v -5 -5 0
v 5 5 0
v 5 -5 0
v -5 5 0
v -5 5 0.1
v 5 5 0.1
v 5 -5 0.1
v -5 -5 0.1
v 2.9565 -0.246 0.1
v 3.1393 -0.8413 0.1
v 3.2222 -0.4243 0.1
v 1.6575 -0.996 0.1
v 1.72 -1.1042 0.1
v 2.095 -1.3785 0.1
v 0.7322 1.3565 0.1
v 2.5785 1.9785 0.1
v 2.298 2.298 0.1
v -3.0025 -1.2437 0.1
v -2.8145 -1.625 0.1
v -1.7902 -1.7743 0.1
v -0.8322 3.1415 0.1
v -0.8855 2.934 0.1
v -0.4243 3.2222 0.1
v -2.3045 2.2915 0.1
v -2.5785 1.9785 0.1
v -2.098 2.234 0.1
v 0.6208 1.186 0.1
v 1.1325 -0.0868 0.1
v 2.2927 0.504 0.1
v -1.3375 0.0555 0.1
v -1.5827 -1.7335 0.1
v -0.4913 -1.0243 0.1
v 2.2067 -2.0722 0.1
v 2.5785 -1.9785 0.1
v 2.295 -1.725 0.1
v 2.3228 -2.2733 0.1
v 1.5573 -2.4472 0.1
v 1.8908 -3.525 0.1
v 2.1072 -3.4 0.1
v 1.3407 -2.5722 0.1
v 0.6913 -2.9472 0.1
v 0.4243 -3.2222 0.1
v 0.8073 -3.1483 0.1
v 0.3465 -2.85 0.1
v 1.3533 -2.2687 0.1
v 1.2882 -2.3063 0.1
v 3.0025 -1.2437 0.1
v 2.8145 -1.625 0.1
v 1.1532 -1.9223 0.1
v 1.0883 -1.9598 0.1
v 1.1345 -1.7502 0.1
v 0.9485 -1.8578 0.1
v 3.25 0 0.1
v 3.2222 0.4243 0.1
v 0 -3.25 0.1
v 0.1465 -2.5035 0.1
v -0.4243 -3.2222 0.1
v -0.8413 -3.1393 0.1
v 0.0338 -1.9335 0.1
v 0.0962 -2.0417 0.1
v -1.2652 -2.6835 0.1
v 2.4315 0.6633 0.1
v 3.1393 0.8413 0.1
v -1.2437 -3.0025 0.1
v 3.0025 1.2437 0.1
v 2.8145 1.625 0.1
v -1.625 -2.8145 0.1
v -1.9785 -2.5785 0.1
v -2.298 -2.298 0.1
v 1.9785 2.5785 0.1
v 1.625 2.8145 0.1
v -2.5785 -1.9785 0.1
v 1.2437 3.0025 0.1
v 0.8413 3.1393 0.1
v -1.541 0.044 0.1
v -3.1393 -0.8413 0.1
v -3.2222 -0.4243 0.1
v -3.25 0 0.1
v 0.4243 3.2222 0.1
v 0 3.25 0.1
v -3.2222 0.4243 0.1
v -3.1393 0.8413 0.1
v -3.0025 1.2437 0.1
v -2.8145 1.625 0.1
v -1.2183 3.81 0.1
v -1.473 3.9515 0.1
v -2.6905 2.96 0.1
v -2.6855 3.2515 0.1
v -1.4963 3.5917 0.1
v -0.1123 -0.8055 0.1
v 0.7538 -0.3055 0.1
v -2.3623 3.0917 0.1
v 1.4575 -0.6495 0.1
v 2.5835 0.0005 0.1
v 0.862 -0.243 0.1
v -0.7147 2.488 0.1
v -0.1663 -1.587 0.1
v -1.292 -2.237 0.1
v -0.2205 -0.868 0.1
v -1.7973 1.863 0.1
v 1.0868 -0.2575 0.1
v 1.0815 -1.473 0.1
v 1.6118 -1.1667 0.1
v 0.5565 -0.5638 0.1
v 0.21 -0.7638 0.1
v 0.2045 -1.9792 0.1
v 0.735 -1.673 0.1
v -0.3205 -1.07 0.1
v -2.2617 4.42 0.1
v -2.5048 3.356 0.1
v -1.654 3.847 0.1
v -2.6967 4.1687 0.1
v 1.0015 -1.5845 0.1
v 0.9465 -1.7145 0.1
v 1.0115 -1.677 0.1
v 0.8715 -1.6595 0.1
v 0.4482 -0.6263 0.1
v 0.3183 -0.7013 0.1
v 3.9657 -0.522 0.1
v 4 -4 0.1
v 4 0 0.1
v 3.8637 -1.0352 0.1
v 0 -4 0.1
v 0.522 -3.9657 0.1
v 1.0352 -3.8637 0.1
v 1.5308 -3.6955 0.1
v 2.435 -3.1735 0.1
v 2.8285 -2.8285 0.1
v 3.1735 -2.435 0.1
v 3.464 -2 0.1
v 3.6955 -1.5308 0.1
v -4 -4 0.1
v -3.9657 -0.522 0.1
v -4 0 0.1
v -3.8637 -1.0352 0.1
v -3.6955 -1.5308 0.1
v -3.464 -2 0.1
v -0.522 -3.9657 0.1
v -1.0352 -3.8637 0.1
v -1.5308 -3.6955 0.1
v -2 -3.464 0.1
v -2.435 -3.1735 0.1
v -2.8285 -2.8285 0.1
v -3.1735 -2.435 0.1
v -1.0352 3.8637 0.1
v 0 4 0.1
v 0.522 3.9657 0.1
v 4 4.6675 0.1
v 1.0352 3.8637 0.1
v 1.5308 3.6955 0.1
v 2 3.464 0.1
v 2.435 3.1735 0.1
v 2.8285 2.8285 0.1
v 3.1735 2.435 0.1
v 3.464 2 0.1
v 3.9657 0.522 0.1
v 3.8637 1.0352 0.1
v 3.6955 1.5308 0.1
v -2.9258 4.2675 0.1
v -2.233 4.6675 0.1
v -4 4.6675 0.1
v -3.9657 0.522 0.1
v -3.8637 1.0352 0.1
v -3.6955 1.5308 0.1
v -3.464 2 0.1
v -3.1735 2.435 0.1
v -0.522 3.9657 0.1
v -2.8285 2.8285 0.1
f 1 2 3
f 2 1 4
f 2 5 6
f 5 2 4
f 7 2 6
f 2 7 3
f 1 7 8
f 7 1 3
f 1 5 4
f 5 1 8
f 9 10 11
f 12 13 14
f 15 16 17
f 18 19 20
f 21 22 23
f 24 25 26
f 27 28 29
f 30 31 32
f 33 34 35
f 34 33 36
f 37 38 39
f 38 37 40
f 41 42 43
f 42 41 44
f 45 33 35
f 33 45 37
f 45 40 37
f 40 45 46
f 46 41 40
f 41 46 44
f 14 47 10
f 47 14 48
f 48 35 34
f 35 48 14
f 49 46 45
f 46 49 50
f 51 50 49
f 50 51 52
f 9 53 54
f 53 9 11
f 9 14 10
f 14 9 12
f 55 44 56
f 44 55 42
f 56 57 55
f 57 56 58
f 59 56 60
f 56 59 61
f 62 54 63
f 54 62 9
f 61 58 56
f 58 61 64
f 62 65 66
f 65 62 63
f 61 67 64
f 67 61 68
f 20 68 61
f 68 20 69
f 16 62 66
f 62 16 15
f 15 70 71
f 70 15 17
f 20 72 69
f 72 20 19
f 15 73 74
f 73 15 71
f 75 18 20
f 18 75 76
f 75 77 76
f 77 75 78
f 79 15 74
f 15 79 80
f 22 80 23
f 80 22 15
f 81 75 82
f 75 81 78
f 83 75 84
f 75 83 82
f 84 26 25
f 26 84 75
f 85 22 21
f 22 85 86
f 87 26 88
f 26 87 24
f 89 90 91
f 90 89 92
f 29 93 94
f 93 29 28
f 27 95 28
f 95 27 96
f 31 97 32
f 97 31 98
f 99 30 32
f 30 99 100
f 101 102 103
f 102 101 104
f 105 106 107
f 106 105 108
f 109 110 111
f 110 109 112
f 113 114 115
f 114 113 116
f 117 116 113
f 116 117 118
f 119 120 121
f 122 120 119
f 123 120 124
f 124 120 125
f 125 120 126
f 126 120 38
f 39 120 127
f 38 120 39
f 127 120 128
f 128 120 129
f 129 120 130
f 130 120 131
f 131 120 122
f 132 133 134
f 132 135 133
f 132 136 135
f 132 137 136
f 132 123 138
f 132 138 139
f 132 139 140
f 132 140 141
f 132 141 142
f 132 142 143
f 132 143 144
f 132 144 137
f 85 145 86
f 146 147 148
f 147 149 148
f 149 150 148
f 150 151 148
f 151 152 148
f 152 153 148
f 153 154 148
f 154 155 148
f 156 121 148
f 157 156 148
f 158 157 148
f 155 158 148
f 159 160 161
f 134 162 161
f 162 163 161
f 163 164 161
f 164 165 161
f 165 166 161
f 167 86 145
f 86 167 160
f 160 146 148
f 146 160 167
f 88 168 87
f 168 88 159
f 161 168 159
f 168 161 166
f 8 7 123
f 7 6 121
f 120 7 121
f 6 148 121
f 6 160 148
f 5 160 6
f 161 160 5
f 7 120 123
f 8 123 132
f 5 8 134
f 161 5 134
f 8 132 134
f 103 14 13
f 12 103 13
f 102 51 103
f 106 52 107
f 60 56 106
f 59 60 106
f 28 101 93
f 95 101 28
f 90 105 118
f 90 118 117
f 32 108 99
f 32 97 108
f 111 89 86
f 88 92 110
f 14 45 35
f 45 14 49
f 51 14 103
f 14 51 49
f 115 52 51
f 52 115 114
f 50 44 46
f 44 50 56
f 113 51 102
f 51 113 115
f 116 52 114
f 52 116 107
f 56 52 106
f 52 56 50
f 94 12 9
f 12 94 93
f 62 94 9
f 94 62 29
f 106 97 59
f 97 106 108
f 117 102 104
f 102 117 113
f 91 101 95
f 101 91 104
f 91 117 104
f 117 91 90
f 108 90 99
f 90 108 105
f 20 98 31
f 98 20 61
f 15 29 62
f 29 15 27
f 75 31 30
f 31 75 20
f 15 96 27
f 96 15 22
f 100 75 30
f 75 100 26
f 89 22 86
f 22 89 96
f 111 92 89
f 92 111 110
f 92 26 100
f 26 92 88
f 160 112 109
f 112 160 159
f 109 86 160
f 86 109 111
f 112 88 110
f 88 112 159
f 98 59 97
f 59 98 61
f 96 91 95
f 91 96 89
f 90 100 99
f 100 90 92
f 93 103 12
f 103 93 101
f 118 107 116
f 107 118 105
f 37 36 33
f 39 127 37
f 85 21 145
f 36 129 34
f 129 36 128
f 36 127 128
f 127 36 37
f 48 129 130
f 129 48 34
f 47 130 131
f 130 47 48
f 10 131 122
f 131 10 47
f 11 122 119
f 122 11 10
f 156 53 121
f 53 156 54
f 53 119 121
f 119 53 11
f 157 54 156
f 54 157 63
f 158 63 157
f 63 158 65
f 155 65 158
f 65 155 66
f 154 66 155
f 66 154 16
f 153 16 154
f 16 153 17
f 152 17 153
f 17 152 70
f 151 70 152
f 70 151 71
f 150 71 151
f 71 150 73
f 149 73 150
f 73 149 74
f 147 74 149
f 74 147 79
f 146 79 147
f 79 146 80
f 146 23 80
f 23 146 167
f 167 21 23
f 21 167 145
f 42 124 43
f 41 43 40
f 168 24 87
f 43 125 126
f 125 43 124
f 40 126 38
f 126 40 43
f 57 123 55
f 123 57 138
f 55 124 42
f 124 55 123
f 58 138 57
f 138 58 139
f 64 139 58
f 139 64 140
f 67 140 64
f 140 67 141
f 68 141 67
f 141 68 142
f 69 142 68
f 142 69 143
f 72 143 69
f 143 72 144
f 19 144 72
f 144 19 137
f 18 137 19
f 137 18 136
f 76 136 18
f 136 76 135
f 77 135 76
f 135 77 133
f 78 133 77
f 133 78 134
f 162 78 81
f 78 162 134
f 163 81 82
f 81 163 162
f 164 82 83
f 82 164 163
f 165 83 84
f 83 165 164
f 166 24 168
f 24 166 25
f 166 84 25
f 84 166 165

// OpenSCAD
// file: s/3068bp11s02.scad
use <../../lib.scad>
function ldraw_lib__s__3068bp11s02() = [
// 0 ~Launch Command Logo Pattern Background
// 0 Name: s\3068bp11s02.dat
// 0 Author: Chris Böhnke [KnightOfTarenta]
// 0 !LDRAW_ORG Subpart UPDATE 2025-03
// 0 !LICENSE Licensed under CC BY 4.0 : see CAreadme.txt
// 
// 0 !HELP Dimensions X = 32; Z = 34.67
// 
// 0 BFC CERTIFY CCW
  [0,"BFC","CERTIFY"],
  [0,"BFC","CCW"],
// 
// 0 !HISTORY 2025-03-30 [OrionP] Official Update 2025-03
// 
// 3 16 -16 0 0 -16 0 -16 -15.863 0 -2.088
  [3,16,-16,0,0,-16,0,-16,-15.863,0,-2.088],
// 3 16 -15.863 0 -2.088 -16 0 -16 -15.455 0 -4.141
  [3,16,-15.863,0,-2.088,-16,0,-16,-15.455,0,-4.141],
// 3 16 -2.088 0 -15.863 -16 0 -16 0 0 -16
  [3,16,-2.088,0,-15.863,-16,0,-16,0,0,-16],
// 3 16 -4.141 0 -15.455 -16 0 -16 -2.088 0 -15.863
  [3,16,-4.141,0,-15.455,-16,0,-16,-2.088,0,-15.863],
// 3 16 -6.123 0 -14.782 -16 0 -16 -4.141 0 -15.455
  [3,16,-6.123,0,-14.782,-16,0,-16,-4.141,0,-15.455],
// 3 16 -7.563 0 -14.1 -16 0 -16 -6.123 0 -14.782
  [3,16,-7.563,0,-14.1,-16,0,-16,-6.123,0,-14.782],
// 3 16 -9.74 0 -12.694 -16 0 -16 -8.429 0 -13.6
  [3,16,-9.74,0,-12.694,-16,0,-16,-8.429,0,-13.6],
// 3 16 -8.429 0 -13.6 -16 0 -16 -7.563 0 -14.1
  [3,16,-8.429,0,-13.6,-16,0,-16,-7.563,0,-14.1],
// 3 16 -11.314 0 -11.314 -16 0 -16 -9.74 0 -12.694
  [3,16,-11.314,0,-11.314,-16,0,-16,-9.74,0,-12.694],
// 3 16 -12.694 0 -9.74 -16 0 -16 -11.314 0 -11.314
  [3,16,-12.694,0,-9.74,-16,0,-16,-11.314,0,-11.314],
// 3 16 -13.856 0 -8 -16 0 -16 -12.694 0 -9.74
  [3,16,-13.856,0,-8,-16,0,-16,-12.694,0,-9.74],
// 3 16 -14.782 0 -6.123 -16 0 -16 -13.856 0 -8
  [3,16,-14.782,0,-6.123,-16,0,-16,-13.856,0,-8],
// 3 16 -15.455 0 -4.141 -16 0 -16 -14.782 0 -6.123
  [3,16,-15.455,0,-4.141,-16,0,-16,-14.782,0,-6.123],
// 3 16 16 0 0 15.863 0 -2.088 16 0 -16
  [3,16,16,0,0,15.863,0,-2.088,16,0,-16],
// 3 16 15.863 0 -2.088 15.455 0 -4.141 16 0 -16
  [3,16,15.863,0,-2.088,15.455,0,-4.141,16,0,-16],
// 3 16 15.455 0 -4.141 14.782 0 -6.123 16 0 -16
  [3,16,15.455,0,-4.141,14.782,0,-6.123,16,0,-16],
// 3 16 14.782 0 -6.123 13.856 0 -8 16 0 -16
  [3,16,14.782,0,-6.123,13.856,0,-8,16,0,-16],
// 3 16 2.088 0 -15.863 0 0 -16 16 0 -16
  [3,16,2.088,0,-15.863,0,0,-16,16,0,-16],
// 3 16 4.141 0 -15.455 2.088 0 -15.863 16 0 -16
  [3,16,4.141,0,-15.455,2.088,0,-15.863,16,0,-16],
// 3 16 6.123 0 -14.782 4.141 0 -15.455 16 0 -16
  [3,16,6.123,0,-14.782,4.141,0,-15.455,16,0,-16],
// 3 16 8 0 -13.856 6.123 0 -14.782 16 0 -16
  [3,16,8,0,-13.856,6.123,0,-14.782,16,0,-16],
// 3 16 9.74 0 -12.694 8 0 -13.856 16 0 -16
  [3,16,9.74,0,-12.694,8,0,-13.856,16,0,-16],
// 3 16 11.314 0 -11.314 9.74 0 -12.694 16 0 -16
  [3,16,11.314,0,-11.314,9.74,0,-12.694,16,0,-16],
// 3 16 12.694 0 -9.74 11.314 0 -11.314 16 0 -16
  [3,16,12.694,0,-9.74,11.314,0,-11.314,16,0,-16],
// 3 16 13.856 0 -8 12.694 0 -9.74 16 0 -16
  [3,16,13.856,0,-8,12.694,0,-9.74,16,0,-16],
// 3 16 5.892 0 15.806 4.141 0 15.455 4.873 0 15.24
  [3,16,5.892,0,15.806,4.141,0,15.455,4.873,0,15.24],
// 3 16 -16 0 18.67 -2.088 0 15.863 0 0 16
  [3,16,-16,0,18.67,-2.088,0,15.863,0,0,16],
// 3 16 -16 0 18.67 -4.141 0 15.455 -2.088 0 15.863
  [3,16,-16,0,18.67,-4.141,0,15.455,-2.088,0,15.863],
// 3 16 -16 0 18.67 -6.123 0 14.782 -4.141 0 15.455
  [3,16,-16,0,18.67,-6.123,0,14.782,-4.141,0,15.455],
// 3 16 -16 0 18.67 -8 0 13.856 -6.123 0 14.782
  [3,16,-16,0,18.67,-8,0,13.856,-6.123,0,14.782],
// 3 16 -16 0 18.67 -9.74 0 12.694 -8 0 13.856
  [3,16,-16,0,18.67,-9.74,0,12.694,-8,0,13.856],
// 3 16 -16 0 18.67 -11.314 0 11.314 -9.74 0 12.694
  [3,16,-16,0,18.67,-11.314,0,11.314,-9.74,0,12.694],
// 3 16 -16 0 18.67 -12.694 0 9.74 -11.314 0 11.314
  [3,16,-16,0,18.67,-12.694,0,9.74,-11.314,0,11.314],
// 3 16 -16 0 18.67 -13.856 0 8 -12.694 0 9.74
  [3,16,-16,0,18.67,-13.856,0,8,-12.694,0,9.74],
// 3 16 -16 0 18.67 -16 0 0 -15.863 0 2.088
  [3,16,-16,0,18.67,-16,0,0,-15.863,0,2.088],
// 3 16 -16 0 18.67 -15.863 0 2.088 -15.455 0 4.141
  [3,16,-16,0,18.67,-15.863,0,2.088,-15.455,0,4.141],
// 3 16 -16 0 18.67 -15.455 0 4.141 -14.782 0 6.123
  [3,16,-16,0,18.67,-15.455,0,4.141,-14.782,0,6.123],
// 3 16 -16 0 18.67 -14.782 0 6.123 -13.856 0 8
  [3,16,-16,0,18.67,-14.782,0,6.123,-13.856,0,8],
// 3 16 16 0 18.67 8.932 0 18.67 11.703 0 17.07
  [3,16,16,0,18.67,8.932,0,18.67,11.703,0,17.07],
// 3 16 16 0 18.67 15.863 0 2.088 16 0 0
  [3,16,16,0,18.67,15.863,0,2.088,16,0,0],
// 3 16 16 0 18.67 15.455 0 4.141 15.863 0 2.088
  [3,16,16,0,18.67,15.455,0,4.141,15.863,0,2.088],
// 3 16 16 0 18.67 14.782 0 6.123 15.455 0 4.141
  [3,16,16,0,18.67,14.782,0,6.123,15.455,0,4.141],
// 3 16 16 0 18.67 13.856 0 8 14.782 0 6.123
  [3,16,16,0,18.67,13.856,0,8,14.782,0,6.123],
// 3 16 16 0 18.67 12.694 0 9.74 13.856 0 8
  [3,16,16,0,18.67,12.694,0,9.74,13.856,0,8],
// 4 16 2.088 0 15.863 4.141 0 15.455 5.892 0 15.806 8.932 0 18.67
  [4,16,2.088,0,15.863,4.141,0,15.455,5.892,0,15.806,8.932,0,18.67],
// 4 16 0 0 16 2.088 0 15.863 8.932 0 18.67 -16 0 18.67
  [4,16,0,0,16,2.088,0,15.863,8.932,0,18.67,-16,0,18.67],
// 4 16 10.742 0 13.006 10.762 0 11.84 11.314 0 11.314 11.703 0 17.07
  [4,16,10.742,0,13.006,10.762,0,11.84,11.314,0,11.314,11.703,0,17.07],
// 4 16 16 0 18.67 11.703 0 17.07 11.314 0 11.314 12.694 0 9.74
  [4,16,16,0,18.67,11.703,0,17.07,11.314,0,11.314,12.694,0,9.74],
];
module ldraw_lib__s__3068bp11s02(step=0, col=false, unit=2/5, alt=false, line=0.2, solid=!$preview)
    makepoly(ldraw_lib__s__3068bp11s02(), step=step, col=col, unit=unit, alt=alt, line=line, solid=solid);
ldraw_lib__s__3068bp11s02(line=0.2);
// file: ../p/logo-launchcommand-bg.scad
use <../lib.scad>
function ldraw_lib__logo_launchcommand_bg() = [
// 0 ~Launch Command Logo Pattern (without Border)
// 0 Name: logo-launchcommand-bg.dat
// 0 Author: Chris Böhnke [KnightOfTarenta]
// 0 !LDRAW_ORG Primitive UPDATE 2025-04
// 0 !LICENSE Licensed under CC BY 4.0 : see CAreadme.txt
// 
// 0 !HELP Dimensions X = 32; Z = 34.67
// 
// 0 BFC CERTIFY CCW
  [0,"BFC","CERTIFY"],
  [0,"BFC","CCW"],
// 
// 0 !HISTORY 2025-04-27 [OrionP] Official Update 2025-04
// 
// 0 // Colour 16 Main Colour
// 3 16 -12.889 0 -1.697 -12.557 0 -3.365 -11.826 0 -.984
  [3,16,-12.889,0,-1.697,-12.557,0,-3.365,-11.826,0,-.984],
// 3 16 -8.38 0 -5.514 -6.88 0 -4.417 -6.63 0 -3.984
  [3,16,-8.38,0,-5.514,-6.88,0,-4.417,-6.63,0,-3.984],
// 3 16 -9.192 0 9.192 -10.314 0 7.914 -2.929 0 5.426
  [3,16,-9.192,0,9.192,-10.314,0,7.914,-2.929,0,5.426],
// 3 16 7.161 0 -7.097 11.258 0 -6.5 12.01 0 -4.975
  [3,16,7.161,0,-7.097,11.258,0,-6.5,12.01,0,-4.975],
// 3 16 1.697 0 12.889 3.542 0 11.736 3.329 0 12.566
  [3,16,1.697,0,12.889,3.542,0,11.736,3.329,0,12.566],
// 3 16 8.392 0 8.936 10.314 0 7.914 9.218 0 9.166
  [3,16,8.392,0,8.936,10.314,0,7.914,9.218,0,9.166],
// 3 16 -9.171 0 2.016 -4.53 0 -.347 -2.483 0 4.744
  [3,16,-9.171,0,2.016,-4.53,0,-.347,-2.483,0,4.744],
// 3 16 1.965 0 -4.097 6.331 0 -6.934 5.35 0 .222
  [3,16,1.965,0,-4.097,6.331,0,-6.934,5.35,0,.222],
// 4 16 -9.18 0 -6.9 -10.314 0 -7.914 -9.291 0 -9.093 -8.827 0 -8.289
  [4,16,-9.18,0,-6.9,-10.314,0,-7.914,-9.291,0,-9.093,-8.827,0,-8.289],
// 4 16 -7.563 0 -14.1 -5.363 0 -10.289 -6.229 0 -9.789 -8.429 0 -13.6
  [4,16,-7.563,0,-14.1,-5.363,0,-10.289,-6.229,0,-9.789,-8.429,0,-13.6],
// 4 16 -1.386 0 -11.4 -2.765 0 -11.789 -3.229 0 -12.593 -1.697 0 -12.889
  [4,16,-1.386,0,-11.4,-2.765,0,-11.789,-3.229,0,-12.593,-1.697,0,-12.889],
// 4 16 -9.18 0 -6.9 -8.827 0 -8.289 -6.229 0 -9.789 -5.413 0 -9.075
  [4,16,-9.18,0,-6.9,-8.827,0,-8.289,-6.229,0,-9.789,-5.413,0,-9.075],
// 4 16 -5.413 0 -9.075 -6.229 0 -9.789 -5.363 0 -10.289 -5.153 0 -9.225
  [4,16,-5.413,0,-9.075,-6.229,0,-9.789,-5.363,0,-10.289,-5.153,0,-9.225],
// 4 16 -1.386 0 -11.4 -5.153 0 -9.225 -5.363 0 -10.289 -2.765 0 -11.789
  [4,16,-1.386,0,-11.4,-5.153,0,-9.225,-5.363,0,-10.289,-2.765,0,-11.789],
// 4 16 -12.557 0 -3.365 -12.01 0 -4.975 -11.258 0 -6.5 -8.38 0 -5.514
  [4,16,-12.557,0,-3.365,-12.01,0,-4.975,-11.258,0,-6.5,-8.38,0,-5.514],
// 4 16 -10.314 0 -7.914 -9.18 0 -6.9 -8.38 0 -5.514 -11.258 0 -6.5
  [4,16,-10.314,0,-7.914,-9.18,0,-6.9,-8.38,0,-5.514,-11.258,0,-6.5],
// 4 16 -4.613 0 -7.689 -5.413 0 -9.075 -5.153 0 -9.225 -4.353 0 -7.839
  [4,16,-4.613,0,-7.689,-5.413,0,-9.075,-5.153,0,-9.225,-4.353,0,-7.839],
// 4 16 -3.794 0 -7.431 -4.538 0 -7.001 -4.613 0 -7.689 -4.353 0 -7.839
  [4,16,-3.794,0,-7.431,-4.538,0,-7.001,-4.613,0,-7.689,-4.353,0,-7.839],
// 4 16 -12.889 0 -1.697 -11.826 0 -.984 -12.889 0 1.697 -13 0 0
  [4,16,-12.889,0,-1.697,-11.826,0,-.984,-12.889,0,1.697,-13,0,0],
// 4 16 -12.557 0 -3.365 -8.38 0 -5.514 -6.63 0 -3.984 -11.826 0 -.984
  [4,16,-12.557,0,-3.365,-8.38,0,-5.514,-6.63,0,-3.984,-11.826,0,-.984],
// 4 16 -1.697 0 -12.889 0 0 -13 -.586 0 -10.014 -1.386 0 -11.4
  [4,16,-1.697,0,-12.889,0,0,-13,-.586,0,-10.014,-1.386,0,-11.4],
// 4 16 0 0 -13 1.697 0 -12.889 3.365 0 -12.557 -.586 0 -10.014
  [4,16,0,0,-13,1.697,0,-12.889,3.365,0,-12.557,-.586,0,-10.014],
// 4 16 5.061 0 -10.734 -.135 0 -7.734 -.385 0 -8.167 -.586 0 -10.014
  [4,16,5.061,0,-10.734,-.135,0,-7.734,-.385,0,-8.167,-.586,0,-10.014],
// 4 16 -11.826 0 -.984 -9.726 0 2.653 -12.557 0 3.365 -12.889 0 1.697
  [4,16,-11.826,0,-.984,-9.726,0,2.653,-12.557,0,3.365,-12.889,0,1.697],
// 4 16 -.586 0 -10.014 3.365 0 -12.557 4.975 0 -12.01 5.061 0 -10.734
  [4,16,-.586,0,-10.014,3.365,0,-12.557,4.975,0,-12.01,5.061,0,-10.734],
// 4 16 -12.557 0 3.365 -9.726 0 2.653 -11.258 0 6.5 -12.01 0 4.975
  [4,16,-12.557,0,3.365,-9.726,0,2.653,-11.258,0,6.5,-12.01,0,4.975],
// 4 16 4.975 0 -12.01 6.5 0 -11.258 7.914 0 -10.314 5.061 0 -10.734
  [4,16,4.975,0,-12.01,6.5,0,-11.258,7.914,0,-10.314,5.061,0,-10.734],
// 4 16 5.061 0 -10.734 7.914 0 -10.314 9.192 0 -9.192 7.161 0 -7.097
  [4,16,5.061,0,-10.734,7.914,0,-10.314,9.192,0,-9.192,7.161,0,-7.097],
// 4 16 -11.258 0 6.5 -9.726 0 2.653 -2.929 0 5.426 -10.314 0 7.914
  [4,16,-11.258,0,6.5,-9.726,0,2.653,-2.929,0,5.426,-10.314,0,7.914],
// 4 16 -6.5 0 11.258 -7.914 0 10.314 -9.192 0 9.192 -2.929 0 5.426
  [4,16,-6.5,0,11.258,-7.914,0,10.314,-9.192,0,9.192,-2.929,0,5.426],
// 4 16 9.192 0 -9.192 10.314 0 -7.914 11.258 0 -6.5 7.161 0 -7.097
  [4,16,9.192,0,-9.192,10.314,0,-7.914,11.258,0,-6.5,7.161,0,-7.097],
// 4 16 -3.365 0 12.557 -4.975 0 12.01 -6.5 0 11.258 -2.929 0 5.426
  [4,16,-3.365,0,12.557,-4.975,0,12.01,-6.5,0,11.258,-2.929,0,5.426],
// 4 16 7.161 0 -7.097 12.01 0 -4.975 12.557 0 -3.365 6.164 0 .176
  [4,16,7.161,0,-7.097,12.01,0,-4.975,12.557,0,-3.365,6.164,0,.176],
// 4 16 12.557 0 -3.365 12.889 0 -1.697 13 0 0 6.164 0 .176
  [4,16,12.557,0,-3.365,12.889,0,-1.697,13,0,0,6.164,0,.176],
// 4 16 -3.365 0 12.557 -2.929 0 5.426 0 0 13 -1.697 0 12.889
  [4,16,-3.365,0,12.557,-2.929,0,5.426,0,0,13,-1.697,0,12.889],
// 4 16 -2.929 0 5.426 3.542 0 11.736 1.697 0 12.889 0 0 13
  [4,16,-2.929,0,5.426,3.542,0,11.736,1.697,0,12.889,0,0,13],
// 4 16 13 0 0 12.889 0 1.697 12.557 0 3.365 6.164 0 .176
  [4,16,13,0,0,12.889,0,1.697,12.557,0,3.365,6.164,0,.176],
// 4 16 11.258 0 6.5 6.164 0 .176 12.557 0 3.365 12.01 0 4.975
  [4,16,11.258,0,6.5,6.164,0,.176,12.557,0,3.365,12.01,0,4.975],
// 4 16 10.314 0 7.914 8.392 0 8.936 6.164 0 .176 11.258 0 6.5
  [4,16,10.314,0,7.914,8.392,0,8.936,6.164,0,.176,11.258,0,6.5],
// 4 16 5.892 0 15.806 4.873 0 15.24 3.329 0 12.566 3.542 0 11.736
  [4,16,5.892,0,15.806,4.873,0,15.24,3.329,0,12.566,3.542,0,11.736],
// 4 16 10.742 0 13.006 8.392 0 8.936 9.218 0 9.166 10.762 0 11.84
  [4,16,10.742,0,13.006,8.392,0,8.936,9.218,0,9.166,10.762,0,11.84],
// 4 16 .449 0 -3.222 9.449 0 12.367 5.985 0 14.367 -3.015 0 -1.222
  [4,16,.449,0,-3.222,9.449,0,12.367,5.985,0,14.367,-3.015,0,-1.222],
// 4 16 -10.334 0 .002 -5.83 0 -2.598 -4.53 0 -.347 -9.171 0 2.016
  [4,16,-10.334,0,.002,-5.83,0,-2.598,-4.53,0,-.347,-9.171,0,2.016],
// 4 16 2.859 0 9.952 -2.483 0 4.744 -4.53 0 -.347 -3.448 0 -.972
  [4,16,2.859,0,9.952,-2.483,0,4.744,-4.53,0,-.347,-3.448,0,-.972],
// 4 16 1.965 0 -4.097 .665 0 -6.348 5.168 0 -8.948 6.331 0 -6.934
  [4,16,1.965,0,-4.097,.665,0,-6.348,5.168,0,-8.948,6.331,0,-6.934],
// 4 16 7.189 0 7.452 .882 0 -3.472 1.965 0 -4.097 5.35 0 .222
  [4,16,7.189,0,7.452,.882,0,-3.472,1.965,0,-4.097,5.35,0,.222],
// 4 16 -6.447 0 -4.667 -4.326 0 -5.892 -2.226 0 -2.255 -4.347 0 -1.03
  [4,16,-6.447,0,-4.667,-4.326,0,-5.892,-2.226,0,-2.255,-4.347,0,-1.03],
// 4 16 -.818 0 -7.917 1.282 0 -4.28 -.84 0 -3.055 -2.94 0 -6.692
  [4,16,-.818,0,-7.917,1.282,0,-4.28,-.84,0,-3.055,-2.94,0,-6.692],
// 4 16 10.019 0 13.424 10.787 0 16.675 9.047 0 17.68 6.616 0 15.388
  [4,16,10.019,0,13.424,10.787,0,16.675,9.047,0,17.68,6.616,0,15.388],
// 4 16 -4.046 0 -6.708 -3.786 0 -6.858 -3.486 0 -6.638 -4.006 0 -6.338
  [4,16,-4.046,0,-6.708,-3.786,0,-6.858,-3.486,0,-6.638,-4.006,0,-6.338],
// 4 16 -3.486 0 -6.638 -1.273 0 -2.805 -1.793 0 -2.505 -4.006 0 -6.338
  [4,16,-3.486,0,-6.638,-1.273,0,-2.805,-1.793,0,-2.505,-4.006,0,-6.338],
];
module ldraw_lib__logo_launchcommand_bg(step=0, col=false, unit=2/5, alt=false, line=0.2, solid=!$preview)
    makepoly(ldraw_lib__logo_launchcommand_bg(), step=step, col=col, unit=unit, alt=alt, line=line, solid=solid);
ldraw_lib__logo_launchcommand_bg(line=0.2);
// file: ../p/box5-12.scad
use <../lib.scad>
function ldraw_lib__box5_12() = [
// 0 Box with 5 Faces without Any Edges
// 0 Name: box5-12.dat
// 0 Author: Chris Dee [cwdee]
// 0 !LDRAW_ORG Primitive UPDATE 2009-02
// 0 !LICENSE Licensed under CC BY 4.0 : see CAreadme.txt
// 
// 0 BFC CERTIFY CCW
  [0,"BFC","CERTIFY"],
  [0,"BFC","CCW"],
// 
// 0 !HISTORY 2009-09-03 [PTadmin] Official Update 2009-02
// 
// 
// 4 16 1 1 1 1 1 -1 -1 1 -1 -1 1 1
  [4,16,1,1,1,1,1,-1,-1,1,-1,-1,1,1],
// 4 16 -1 0 1 1 0 1 1 1 1 -1 1 1
  [4,16,-1,0,1,1,0,1,1,1,1,-1,1,1],
// 4 16 -1 0 -1 -1 0 1 -1 1 1 -1 1 -1
  [4,16,-1,0,-1,-1,0,1,-1,1,1,-1,1,-1],
// 4 16 1 0 -1 -1 0 -1 -1 1 -1 1 1 -1
  [4,16,1,0,-1,-1,0,-1,-1,1,-1,1,1,-1],
// 4 16 1 0 1 1 0 -1 1 1 -1 1 1 1
  [4,16,1,0,1,1,0,-1,1,1,-1,1,1,1],
// 0
];
module ldraw_lib__box5_12(step=0, col=false, unit=2/5, alt=false, line=0.2, solid=!$preview)
    makepoly(ldraw_lib__box5_12(), step=step, col=col, unit=unit, alt=alt, line=line, solid=solid);
ldraw_lib__box5_12(line=0.2);
// file: 169635c.scad
use <../lib.scad>
use <../p/box5-12.scad>
use <../p/logo-launchcommand-bg.scad>
use <../p/logo-launchcommand.scad>
use <s/3068bp11s02.scad>
function ldraw_lib__169635c() = [
// 0 Sticker  1.3 x  1.3 with Launch Command Logo Facing Right
// 0 Name: 169635c.dat
// 0 Author: Chris Böhnke [KnightOfTarenta]
// 0 !LDRAW_ORG Part UPDATE 2025-04
// 0 !LICENSE Licensed under CC BY 4.0 : see CAreadme.txt
// 
// 0 BFC CERTIFY CCW
  [0,"BFC","CERTIFY"],
  [0,"BFC","CCW"],
// 
// 0 !KEYWORDS Bricklink 6614stk01, Launch Command, Launch Evac 1
// 0 !KEYWORDS Rebrickable 169635, Set 6614, space port, town
// 
// 0 !HISTORY 2025-04-27 [OrionP] Official Update 2025-04
// 
// 0 // Sticker Base
// 1 16 0 -.25 0 12.5 0 0 0 .25 0 0 0 12.5 box5-12.dat
  [1,16,0,-.25,0,12.5,0,0,0,.25,0,0,0,12.5, ldraw_lib__box5_12()],
// 
// 0 // Pattern
// 1 16 0 -.25 0 .625 0 0 0 1 0 0 0 .625 logo-launchcommand-bg.dat
  [1,16,0,-.25,0,.625,0,0,0,1,0,0,0,.625, ldraw_lib__logo_launchcommand_bg()],
// 1 16 0 -.25 0 .625 0 0 0 1 0 0 0 .625 s\3068bp11s02.dat
  [1,16,0,-.25,0,.625,0,0,0,1,0,0,0,.625, ldraw_lib__s__3068bp11s02()],
// 3 16 0 -.25 -10 -12.5 -.25 -12.5 12.5 -.25 -12.5
  [3,16,0,-.25,-10,-12.5,-.25,-12.5,12.5,-.25,-12.5],
// 3 16 -10 -.25 0 -12.5 -.25 12.5 -12.5 -.25 -12.5
  [3,16,-10,-.25,0,-12.5,-.25,12.5,-12.5,-.25,-12.5],
// 3 16 -10 -.25 0 -12.5 -.25 -12.5 -10 -.25 -10
  [3,16,-10,-.25,0,-12.5,-.25,-12.5,-10,-.25,-10],
// 3 16 -10 -.25 0 -10 -.25 11.66875 -12.5 -.25 12.5
  [3,16,-10,-.25,0,-10,-.25,11.66875,-12.5,-.25,12.5],
// 3 16 -10 -.25 11.66875 5.5825 -.25 11.66875 -12.5 -.25 12.5
  [3,16,-10,-.25,11.66875,5.5825,-.25,11.66875,-12.5,-.25,12.5],
// 3 16 -12.5 -.25 12.5 5.5825 -.25 11.66875 12.5 -.25 12.5
  [3,16,-12.5,-.25,12.5,5.5825,-.25,11.66875,12.5,-.25,12.5],
// 3 16 12.5 -.25 12.5 5.5825 -.25 11.66875 10 -.25 11.66875
  [3,16,12.5,-.25,12.5,5.5825,-.25,11.66875,10,-.25,11.66875],
// 3 16 0 -.25 -10 -10 -.25 -10 -12.5 -.25 -12.5
  [3,16,0,-.25,-10,-10,-.25,-10,-12.5,-.25,-12.5],
// 3 16 10 -.25 -10 0 -.25 -10 12.5 -.25 -12.5
  [3,16,10,-.25,-10,0,-.25,-10,12.5,-.25,-12.5],
// 3 16 10 -.25 0 12.5 -.25 -12.5 12.5 -.25 12.5
  [3,16,10,-.25,0,12.5,-.25,-12.5,12.5,-.25,12.5],
// 3 16 10 -.25 0 12.5 -.25 12.5 10 -.25 11.66875
  [3,16,10,-.25,0,12.5,-.25,12.5,10,-.25,11.66875],
// 3 16 10 -.25 0 10 -.25 -10 12.5 -.25 -12.5
  [3,16,10,-.25,0,10,-.25,-10,12.5,-.25,-12.5],
// 
// 0 BFC NOCLIP
  [0,"BFC","NOCLIP"],
// 1 16 0 -.25 0 .625 0 0 0 1 0 0 0 .625 logo-launchcommand.dat
  [1,16,0,-.25,0,.625,0,0,0,1,0,0,0,.625, ldraw_lib__logo_launchcommand()],
];
module ldraw_lib__169635c(step=0, col=false, unit=2/5, alt=false, line=0.2, solid=!$preview)
    makepoly(ldraw_lib__169635c(), step=step, col=col, unit=unit, alt=alt, line=line, solid=solid);
ldraw_lib__169635c(line=0.2);
// main file
use <../lib.scad>
use <169635c.scad>
function ldraw_lib__169635d() = [
// 0 Sticker  1.3 x  1.3 with Launch Command Logo Facing Left
// 0 Name: 169635d.dat
// 0 Author: Chris Böhnke [KnightOfTarenta]
// 0 !LDRAW_ORG Part UPDATE 2025-04
// 0 !LICENSE Licensed under CC BY 4.0 : see CAreadme.txt
// 
// 0 BFC CERTIFY CCW
  [0,"BFC","CERTIFY"],
  [0,"BFC","CCW"],
// 
// 0 !KEYWORDS Bricklink 6614stk01, Launch Command, Launch Evac 1
// 0 !KEYWORDS Rebrickable 169635, Set 6614, space port, town
// 
// 0 !HISTORY 2025-04-27 [OrionP] Official Update 2025-04
// 
// 1 16 0 0 0 -1 0 0 0 1 0 0 0 1 169635c.dat
  [1,16,0,0,0,-1,0,0,0,1,0,0,0,1, ldraw_lib__169635c()],
];
module ldraw_lib__169635d(step=0, col=false, unit=2/5, alt=false, line=0.2, solid=!$preview)
    makepoly(ldraw_lib__169635d(), step=step, col=col, unit=unit, alt=alt, line=line, solid=solid);
ldraw_lib__169635d(line=0.2);
